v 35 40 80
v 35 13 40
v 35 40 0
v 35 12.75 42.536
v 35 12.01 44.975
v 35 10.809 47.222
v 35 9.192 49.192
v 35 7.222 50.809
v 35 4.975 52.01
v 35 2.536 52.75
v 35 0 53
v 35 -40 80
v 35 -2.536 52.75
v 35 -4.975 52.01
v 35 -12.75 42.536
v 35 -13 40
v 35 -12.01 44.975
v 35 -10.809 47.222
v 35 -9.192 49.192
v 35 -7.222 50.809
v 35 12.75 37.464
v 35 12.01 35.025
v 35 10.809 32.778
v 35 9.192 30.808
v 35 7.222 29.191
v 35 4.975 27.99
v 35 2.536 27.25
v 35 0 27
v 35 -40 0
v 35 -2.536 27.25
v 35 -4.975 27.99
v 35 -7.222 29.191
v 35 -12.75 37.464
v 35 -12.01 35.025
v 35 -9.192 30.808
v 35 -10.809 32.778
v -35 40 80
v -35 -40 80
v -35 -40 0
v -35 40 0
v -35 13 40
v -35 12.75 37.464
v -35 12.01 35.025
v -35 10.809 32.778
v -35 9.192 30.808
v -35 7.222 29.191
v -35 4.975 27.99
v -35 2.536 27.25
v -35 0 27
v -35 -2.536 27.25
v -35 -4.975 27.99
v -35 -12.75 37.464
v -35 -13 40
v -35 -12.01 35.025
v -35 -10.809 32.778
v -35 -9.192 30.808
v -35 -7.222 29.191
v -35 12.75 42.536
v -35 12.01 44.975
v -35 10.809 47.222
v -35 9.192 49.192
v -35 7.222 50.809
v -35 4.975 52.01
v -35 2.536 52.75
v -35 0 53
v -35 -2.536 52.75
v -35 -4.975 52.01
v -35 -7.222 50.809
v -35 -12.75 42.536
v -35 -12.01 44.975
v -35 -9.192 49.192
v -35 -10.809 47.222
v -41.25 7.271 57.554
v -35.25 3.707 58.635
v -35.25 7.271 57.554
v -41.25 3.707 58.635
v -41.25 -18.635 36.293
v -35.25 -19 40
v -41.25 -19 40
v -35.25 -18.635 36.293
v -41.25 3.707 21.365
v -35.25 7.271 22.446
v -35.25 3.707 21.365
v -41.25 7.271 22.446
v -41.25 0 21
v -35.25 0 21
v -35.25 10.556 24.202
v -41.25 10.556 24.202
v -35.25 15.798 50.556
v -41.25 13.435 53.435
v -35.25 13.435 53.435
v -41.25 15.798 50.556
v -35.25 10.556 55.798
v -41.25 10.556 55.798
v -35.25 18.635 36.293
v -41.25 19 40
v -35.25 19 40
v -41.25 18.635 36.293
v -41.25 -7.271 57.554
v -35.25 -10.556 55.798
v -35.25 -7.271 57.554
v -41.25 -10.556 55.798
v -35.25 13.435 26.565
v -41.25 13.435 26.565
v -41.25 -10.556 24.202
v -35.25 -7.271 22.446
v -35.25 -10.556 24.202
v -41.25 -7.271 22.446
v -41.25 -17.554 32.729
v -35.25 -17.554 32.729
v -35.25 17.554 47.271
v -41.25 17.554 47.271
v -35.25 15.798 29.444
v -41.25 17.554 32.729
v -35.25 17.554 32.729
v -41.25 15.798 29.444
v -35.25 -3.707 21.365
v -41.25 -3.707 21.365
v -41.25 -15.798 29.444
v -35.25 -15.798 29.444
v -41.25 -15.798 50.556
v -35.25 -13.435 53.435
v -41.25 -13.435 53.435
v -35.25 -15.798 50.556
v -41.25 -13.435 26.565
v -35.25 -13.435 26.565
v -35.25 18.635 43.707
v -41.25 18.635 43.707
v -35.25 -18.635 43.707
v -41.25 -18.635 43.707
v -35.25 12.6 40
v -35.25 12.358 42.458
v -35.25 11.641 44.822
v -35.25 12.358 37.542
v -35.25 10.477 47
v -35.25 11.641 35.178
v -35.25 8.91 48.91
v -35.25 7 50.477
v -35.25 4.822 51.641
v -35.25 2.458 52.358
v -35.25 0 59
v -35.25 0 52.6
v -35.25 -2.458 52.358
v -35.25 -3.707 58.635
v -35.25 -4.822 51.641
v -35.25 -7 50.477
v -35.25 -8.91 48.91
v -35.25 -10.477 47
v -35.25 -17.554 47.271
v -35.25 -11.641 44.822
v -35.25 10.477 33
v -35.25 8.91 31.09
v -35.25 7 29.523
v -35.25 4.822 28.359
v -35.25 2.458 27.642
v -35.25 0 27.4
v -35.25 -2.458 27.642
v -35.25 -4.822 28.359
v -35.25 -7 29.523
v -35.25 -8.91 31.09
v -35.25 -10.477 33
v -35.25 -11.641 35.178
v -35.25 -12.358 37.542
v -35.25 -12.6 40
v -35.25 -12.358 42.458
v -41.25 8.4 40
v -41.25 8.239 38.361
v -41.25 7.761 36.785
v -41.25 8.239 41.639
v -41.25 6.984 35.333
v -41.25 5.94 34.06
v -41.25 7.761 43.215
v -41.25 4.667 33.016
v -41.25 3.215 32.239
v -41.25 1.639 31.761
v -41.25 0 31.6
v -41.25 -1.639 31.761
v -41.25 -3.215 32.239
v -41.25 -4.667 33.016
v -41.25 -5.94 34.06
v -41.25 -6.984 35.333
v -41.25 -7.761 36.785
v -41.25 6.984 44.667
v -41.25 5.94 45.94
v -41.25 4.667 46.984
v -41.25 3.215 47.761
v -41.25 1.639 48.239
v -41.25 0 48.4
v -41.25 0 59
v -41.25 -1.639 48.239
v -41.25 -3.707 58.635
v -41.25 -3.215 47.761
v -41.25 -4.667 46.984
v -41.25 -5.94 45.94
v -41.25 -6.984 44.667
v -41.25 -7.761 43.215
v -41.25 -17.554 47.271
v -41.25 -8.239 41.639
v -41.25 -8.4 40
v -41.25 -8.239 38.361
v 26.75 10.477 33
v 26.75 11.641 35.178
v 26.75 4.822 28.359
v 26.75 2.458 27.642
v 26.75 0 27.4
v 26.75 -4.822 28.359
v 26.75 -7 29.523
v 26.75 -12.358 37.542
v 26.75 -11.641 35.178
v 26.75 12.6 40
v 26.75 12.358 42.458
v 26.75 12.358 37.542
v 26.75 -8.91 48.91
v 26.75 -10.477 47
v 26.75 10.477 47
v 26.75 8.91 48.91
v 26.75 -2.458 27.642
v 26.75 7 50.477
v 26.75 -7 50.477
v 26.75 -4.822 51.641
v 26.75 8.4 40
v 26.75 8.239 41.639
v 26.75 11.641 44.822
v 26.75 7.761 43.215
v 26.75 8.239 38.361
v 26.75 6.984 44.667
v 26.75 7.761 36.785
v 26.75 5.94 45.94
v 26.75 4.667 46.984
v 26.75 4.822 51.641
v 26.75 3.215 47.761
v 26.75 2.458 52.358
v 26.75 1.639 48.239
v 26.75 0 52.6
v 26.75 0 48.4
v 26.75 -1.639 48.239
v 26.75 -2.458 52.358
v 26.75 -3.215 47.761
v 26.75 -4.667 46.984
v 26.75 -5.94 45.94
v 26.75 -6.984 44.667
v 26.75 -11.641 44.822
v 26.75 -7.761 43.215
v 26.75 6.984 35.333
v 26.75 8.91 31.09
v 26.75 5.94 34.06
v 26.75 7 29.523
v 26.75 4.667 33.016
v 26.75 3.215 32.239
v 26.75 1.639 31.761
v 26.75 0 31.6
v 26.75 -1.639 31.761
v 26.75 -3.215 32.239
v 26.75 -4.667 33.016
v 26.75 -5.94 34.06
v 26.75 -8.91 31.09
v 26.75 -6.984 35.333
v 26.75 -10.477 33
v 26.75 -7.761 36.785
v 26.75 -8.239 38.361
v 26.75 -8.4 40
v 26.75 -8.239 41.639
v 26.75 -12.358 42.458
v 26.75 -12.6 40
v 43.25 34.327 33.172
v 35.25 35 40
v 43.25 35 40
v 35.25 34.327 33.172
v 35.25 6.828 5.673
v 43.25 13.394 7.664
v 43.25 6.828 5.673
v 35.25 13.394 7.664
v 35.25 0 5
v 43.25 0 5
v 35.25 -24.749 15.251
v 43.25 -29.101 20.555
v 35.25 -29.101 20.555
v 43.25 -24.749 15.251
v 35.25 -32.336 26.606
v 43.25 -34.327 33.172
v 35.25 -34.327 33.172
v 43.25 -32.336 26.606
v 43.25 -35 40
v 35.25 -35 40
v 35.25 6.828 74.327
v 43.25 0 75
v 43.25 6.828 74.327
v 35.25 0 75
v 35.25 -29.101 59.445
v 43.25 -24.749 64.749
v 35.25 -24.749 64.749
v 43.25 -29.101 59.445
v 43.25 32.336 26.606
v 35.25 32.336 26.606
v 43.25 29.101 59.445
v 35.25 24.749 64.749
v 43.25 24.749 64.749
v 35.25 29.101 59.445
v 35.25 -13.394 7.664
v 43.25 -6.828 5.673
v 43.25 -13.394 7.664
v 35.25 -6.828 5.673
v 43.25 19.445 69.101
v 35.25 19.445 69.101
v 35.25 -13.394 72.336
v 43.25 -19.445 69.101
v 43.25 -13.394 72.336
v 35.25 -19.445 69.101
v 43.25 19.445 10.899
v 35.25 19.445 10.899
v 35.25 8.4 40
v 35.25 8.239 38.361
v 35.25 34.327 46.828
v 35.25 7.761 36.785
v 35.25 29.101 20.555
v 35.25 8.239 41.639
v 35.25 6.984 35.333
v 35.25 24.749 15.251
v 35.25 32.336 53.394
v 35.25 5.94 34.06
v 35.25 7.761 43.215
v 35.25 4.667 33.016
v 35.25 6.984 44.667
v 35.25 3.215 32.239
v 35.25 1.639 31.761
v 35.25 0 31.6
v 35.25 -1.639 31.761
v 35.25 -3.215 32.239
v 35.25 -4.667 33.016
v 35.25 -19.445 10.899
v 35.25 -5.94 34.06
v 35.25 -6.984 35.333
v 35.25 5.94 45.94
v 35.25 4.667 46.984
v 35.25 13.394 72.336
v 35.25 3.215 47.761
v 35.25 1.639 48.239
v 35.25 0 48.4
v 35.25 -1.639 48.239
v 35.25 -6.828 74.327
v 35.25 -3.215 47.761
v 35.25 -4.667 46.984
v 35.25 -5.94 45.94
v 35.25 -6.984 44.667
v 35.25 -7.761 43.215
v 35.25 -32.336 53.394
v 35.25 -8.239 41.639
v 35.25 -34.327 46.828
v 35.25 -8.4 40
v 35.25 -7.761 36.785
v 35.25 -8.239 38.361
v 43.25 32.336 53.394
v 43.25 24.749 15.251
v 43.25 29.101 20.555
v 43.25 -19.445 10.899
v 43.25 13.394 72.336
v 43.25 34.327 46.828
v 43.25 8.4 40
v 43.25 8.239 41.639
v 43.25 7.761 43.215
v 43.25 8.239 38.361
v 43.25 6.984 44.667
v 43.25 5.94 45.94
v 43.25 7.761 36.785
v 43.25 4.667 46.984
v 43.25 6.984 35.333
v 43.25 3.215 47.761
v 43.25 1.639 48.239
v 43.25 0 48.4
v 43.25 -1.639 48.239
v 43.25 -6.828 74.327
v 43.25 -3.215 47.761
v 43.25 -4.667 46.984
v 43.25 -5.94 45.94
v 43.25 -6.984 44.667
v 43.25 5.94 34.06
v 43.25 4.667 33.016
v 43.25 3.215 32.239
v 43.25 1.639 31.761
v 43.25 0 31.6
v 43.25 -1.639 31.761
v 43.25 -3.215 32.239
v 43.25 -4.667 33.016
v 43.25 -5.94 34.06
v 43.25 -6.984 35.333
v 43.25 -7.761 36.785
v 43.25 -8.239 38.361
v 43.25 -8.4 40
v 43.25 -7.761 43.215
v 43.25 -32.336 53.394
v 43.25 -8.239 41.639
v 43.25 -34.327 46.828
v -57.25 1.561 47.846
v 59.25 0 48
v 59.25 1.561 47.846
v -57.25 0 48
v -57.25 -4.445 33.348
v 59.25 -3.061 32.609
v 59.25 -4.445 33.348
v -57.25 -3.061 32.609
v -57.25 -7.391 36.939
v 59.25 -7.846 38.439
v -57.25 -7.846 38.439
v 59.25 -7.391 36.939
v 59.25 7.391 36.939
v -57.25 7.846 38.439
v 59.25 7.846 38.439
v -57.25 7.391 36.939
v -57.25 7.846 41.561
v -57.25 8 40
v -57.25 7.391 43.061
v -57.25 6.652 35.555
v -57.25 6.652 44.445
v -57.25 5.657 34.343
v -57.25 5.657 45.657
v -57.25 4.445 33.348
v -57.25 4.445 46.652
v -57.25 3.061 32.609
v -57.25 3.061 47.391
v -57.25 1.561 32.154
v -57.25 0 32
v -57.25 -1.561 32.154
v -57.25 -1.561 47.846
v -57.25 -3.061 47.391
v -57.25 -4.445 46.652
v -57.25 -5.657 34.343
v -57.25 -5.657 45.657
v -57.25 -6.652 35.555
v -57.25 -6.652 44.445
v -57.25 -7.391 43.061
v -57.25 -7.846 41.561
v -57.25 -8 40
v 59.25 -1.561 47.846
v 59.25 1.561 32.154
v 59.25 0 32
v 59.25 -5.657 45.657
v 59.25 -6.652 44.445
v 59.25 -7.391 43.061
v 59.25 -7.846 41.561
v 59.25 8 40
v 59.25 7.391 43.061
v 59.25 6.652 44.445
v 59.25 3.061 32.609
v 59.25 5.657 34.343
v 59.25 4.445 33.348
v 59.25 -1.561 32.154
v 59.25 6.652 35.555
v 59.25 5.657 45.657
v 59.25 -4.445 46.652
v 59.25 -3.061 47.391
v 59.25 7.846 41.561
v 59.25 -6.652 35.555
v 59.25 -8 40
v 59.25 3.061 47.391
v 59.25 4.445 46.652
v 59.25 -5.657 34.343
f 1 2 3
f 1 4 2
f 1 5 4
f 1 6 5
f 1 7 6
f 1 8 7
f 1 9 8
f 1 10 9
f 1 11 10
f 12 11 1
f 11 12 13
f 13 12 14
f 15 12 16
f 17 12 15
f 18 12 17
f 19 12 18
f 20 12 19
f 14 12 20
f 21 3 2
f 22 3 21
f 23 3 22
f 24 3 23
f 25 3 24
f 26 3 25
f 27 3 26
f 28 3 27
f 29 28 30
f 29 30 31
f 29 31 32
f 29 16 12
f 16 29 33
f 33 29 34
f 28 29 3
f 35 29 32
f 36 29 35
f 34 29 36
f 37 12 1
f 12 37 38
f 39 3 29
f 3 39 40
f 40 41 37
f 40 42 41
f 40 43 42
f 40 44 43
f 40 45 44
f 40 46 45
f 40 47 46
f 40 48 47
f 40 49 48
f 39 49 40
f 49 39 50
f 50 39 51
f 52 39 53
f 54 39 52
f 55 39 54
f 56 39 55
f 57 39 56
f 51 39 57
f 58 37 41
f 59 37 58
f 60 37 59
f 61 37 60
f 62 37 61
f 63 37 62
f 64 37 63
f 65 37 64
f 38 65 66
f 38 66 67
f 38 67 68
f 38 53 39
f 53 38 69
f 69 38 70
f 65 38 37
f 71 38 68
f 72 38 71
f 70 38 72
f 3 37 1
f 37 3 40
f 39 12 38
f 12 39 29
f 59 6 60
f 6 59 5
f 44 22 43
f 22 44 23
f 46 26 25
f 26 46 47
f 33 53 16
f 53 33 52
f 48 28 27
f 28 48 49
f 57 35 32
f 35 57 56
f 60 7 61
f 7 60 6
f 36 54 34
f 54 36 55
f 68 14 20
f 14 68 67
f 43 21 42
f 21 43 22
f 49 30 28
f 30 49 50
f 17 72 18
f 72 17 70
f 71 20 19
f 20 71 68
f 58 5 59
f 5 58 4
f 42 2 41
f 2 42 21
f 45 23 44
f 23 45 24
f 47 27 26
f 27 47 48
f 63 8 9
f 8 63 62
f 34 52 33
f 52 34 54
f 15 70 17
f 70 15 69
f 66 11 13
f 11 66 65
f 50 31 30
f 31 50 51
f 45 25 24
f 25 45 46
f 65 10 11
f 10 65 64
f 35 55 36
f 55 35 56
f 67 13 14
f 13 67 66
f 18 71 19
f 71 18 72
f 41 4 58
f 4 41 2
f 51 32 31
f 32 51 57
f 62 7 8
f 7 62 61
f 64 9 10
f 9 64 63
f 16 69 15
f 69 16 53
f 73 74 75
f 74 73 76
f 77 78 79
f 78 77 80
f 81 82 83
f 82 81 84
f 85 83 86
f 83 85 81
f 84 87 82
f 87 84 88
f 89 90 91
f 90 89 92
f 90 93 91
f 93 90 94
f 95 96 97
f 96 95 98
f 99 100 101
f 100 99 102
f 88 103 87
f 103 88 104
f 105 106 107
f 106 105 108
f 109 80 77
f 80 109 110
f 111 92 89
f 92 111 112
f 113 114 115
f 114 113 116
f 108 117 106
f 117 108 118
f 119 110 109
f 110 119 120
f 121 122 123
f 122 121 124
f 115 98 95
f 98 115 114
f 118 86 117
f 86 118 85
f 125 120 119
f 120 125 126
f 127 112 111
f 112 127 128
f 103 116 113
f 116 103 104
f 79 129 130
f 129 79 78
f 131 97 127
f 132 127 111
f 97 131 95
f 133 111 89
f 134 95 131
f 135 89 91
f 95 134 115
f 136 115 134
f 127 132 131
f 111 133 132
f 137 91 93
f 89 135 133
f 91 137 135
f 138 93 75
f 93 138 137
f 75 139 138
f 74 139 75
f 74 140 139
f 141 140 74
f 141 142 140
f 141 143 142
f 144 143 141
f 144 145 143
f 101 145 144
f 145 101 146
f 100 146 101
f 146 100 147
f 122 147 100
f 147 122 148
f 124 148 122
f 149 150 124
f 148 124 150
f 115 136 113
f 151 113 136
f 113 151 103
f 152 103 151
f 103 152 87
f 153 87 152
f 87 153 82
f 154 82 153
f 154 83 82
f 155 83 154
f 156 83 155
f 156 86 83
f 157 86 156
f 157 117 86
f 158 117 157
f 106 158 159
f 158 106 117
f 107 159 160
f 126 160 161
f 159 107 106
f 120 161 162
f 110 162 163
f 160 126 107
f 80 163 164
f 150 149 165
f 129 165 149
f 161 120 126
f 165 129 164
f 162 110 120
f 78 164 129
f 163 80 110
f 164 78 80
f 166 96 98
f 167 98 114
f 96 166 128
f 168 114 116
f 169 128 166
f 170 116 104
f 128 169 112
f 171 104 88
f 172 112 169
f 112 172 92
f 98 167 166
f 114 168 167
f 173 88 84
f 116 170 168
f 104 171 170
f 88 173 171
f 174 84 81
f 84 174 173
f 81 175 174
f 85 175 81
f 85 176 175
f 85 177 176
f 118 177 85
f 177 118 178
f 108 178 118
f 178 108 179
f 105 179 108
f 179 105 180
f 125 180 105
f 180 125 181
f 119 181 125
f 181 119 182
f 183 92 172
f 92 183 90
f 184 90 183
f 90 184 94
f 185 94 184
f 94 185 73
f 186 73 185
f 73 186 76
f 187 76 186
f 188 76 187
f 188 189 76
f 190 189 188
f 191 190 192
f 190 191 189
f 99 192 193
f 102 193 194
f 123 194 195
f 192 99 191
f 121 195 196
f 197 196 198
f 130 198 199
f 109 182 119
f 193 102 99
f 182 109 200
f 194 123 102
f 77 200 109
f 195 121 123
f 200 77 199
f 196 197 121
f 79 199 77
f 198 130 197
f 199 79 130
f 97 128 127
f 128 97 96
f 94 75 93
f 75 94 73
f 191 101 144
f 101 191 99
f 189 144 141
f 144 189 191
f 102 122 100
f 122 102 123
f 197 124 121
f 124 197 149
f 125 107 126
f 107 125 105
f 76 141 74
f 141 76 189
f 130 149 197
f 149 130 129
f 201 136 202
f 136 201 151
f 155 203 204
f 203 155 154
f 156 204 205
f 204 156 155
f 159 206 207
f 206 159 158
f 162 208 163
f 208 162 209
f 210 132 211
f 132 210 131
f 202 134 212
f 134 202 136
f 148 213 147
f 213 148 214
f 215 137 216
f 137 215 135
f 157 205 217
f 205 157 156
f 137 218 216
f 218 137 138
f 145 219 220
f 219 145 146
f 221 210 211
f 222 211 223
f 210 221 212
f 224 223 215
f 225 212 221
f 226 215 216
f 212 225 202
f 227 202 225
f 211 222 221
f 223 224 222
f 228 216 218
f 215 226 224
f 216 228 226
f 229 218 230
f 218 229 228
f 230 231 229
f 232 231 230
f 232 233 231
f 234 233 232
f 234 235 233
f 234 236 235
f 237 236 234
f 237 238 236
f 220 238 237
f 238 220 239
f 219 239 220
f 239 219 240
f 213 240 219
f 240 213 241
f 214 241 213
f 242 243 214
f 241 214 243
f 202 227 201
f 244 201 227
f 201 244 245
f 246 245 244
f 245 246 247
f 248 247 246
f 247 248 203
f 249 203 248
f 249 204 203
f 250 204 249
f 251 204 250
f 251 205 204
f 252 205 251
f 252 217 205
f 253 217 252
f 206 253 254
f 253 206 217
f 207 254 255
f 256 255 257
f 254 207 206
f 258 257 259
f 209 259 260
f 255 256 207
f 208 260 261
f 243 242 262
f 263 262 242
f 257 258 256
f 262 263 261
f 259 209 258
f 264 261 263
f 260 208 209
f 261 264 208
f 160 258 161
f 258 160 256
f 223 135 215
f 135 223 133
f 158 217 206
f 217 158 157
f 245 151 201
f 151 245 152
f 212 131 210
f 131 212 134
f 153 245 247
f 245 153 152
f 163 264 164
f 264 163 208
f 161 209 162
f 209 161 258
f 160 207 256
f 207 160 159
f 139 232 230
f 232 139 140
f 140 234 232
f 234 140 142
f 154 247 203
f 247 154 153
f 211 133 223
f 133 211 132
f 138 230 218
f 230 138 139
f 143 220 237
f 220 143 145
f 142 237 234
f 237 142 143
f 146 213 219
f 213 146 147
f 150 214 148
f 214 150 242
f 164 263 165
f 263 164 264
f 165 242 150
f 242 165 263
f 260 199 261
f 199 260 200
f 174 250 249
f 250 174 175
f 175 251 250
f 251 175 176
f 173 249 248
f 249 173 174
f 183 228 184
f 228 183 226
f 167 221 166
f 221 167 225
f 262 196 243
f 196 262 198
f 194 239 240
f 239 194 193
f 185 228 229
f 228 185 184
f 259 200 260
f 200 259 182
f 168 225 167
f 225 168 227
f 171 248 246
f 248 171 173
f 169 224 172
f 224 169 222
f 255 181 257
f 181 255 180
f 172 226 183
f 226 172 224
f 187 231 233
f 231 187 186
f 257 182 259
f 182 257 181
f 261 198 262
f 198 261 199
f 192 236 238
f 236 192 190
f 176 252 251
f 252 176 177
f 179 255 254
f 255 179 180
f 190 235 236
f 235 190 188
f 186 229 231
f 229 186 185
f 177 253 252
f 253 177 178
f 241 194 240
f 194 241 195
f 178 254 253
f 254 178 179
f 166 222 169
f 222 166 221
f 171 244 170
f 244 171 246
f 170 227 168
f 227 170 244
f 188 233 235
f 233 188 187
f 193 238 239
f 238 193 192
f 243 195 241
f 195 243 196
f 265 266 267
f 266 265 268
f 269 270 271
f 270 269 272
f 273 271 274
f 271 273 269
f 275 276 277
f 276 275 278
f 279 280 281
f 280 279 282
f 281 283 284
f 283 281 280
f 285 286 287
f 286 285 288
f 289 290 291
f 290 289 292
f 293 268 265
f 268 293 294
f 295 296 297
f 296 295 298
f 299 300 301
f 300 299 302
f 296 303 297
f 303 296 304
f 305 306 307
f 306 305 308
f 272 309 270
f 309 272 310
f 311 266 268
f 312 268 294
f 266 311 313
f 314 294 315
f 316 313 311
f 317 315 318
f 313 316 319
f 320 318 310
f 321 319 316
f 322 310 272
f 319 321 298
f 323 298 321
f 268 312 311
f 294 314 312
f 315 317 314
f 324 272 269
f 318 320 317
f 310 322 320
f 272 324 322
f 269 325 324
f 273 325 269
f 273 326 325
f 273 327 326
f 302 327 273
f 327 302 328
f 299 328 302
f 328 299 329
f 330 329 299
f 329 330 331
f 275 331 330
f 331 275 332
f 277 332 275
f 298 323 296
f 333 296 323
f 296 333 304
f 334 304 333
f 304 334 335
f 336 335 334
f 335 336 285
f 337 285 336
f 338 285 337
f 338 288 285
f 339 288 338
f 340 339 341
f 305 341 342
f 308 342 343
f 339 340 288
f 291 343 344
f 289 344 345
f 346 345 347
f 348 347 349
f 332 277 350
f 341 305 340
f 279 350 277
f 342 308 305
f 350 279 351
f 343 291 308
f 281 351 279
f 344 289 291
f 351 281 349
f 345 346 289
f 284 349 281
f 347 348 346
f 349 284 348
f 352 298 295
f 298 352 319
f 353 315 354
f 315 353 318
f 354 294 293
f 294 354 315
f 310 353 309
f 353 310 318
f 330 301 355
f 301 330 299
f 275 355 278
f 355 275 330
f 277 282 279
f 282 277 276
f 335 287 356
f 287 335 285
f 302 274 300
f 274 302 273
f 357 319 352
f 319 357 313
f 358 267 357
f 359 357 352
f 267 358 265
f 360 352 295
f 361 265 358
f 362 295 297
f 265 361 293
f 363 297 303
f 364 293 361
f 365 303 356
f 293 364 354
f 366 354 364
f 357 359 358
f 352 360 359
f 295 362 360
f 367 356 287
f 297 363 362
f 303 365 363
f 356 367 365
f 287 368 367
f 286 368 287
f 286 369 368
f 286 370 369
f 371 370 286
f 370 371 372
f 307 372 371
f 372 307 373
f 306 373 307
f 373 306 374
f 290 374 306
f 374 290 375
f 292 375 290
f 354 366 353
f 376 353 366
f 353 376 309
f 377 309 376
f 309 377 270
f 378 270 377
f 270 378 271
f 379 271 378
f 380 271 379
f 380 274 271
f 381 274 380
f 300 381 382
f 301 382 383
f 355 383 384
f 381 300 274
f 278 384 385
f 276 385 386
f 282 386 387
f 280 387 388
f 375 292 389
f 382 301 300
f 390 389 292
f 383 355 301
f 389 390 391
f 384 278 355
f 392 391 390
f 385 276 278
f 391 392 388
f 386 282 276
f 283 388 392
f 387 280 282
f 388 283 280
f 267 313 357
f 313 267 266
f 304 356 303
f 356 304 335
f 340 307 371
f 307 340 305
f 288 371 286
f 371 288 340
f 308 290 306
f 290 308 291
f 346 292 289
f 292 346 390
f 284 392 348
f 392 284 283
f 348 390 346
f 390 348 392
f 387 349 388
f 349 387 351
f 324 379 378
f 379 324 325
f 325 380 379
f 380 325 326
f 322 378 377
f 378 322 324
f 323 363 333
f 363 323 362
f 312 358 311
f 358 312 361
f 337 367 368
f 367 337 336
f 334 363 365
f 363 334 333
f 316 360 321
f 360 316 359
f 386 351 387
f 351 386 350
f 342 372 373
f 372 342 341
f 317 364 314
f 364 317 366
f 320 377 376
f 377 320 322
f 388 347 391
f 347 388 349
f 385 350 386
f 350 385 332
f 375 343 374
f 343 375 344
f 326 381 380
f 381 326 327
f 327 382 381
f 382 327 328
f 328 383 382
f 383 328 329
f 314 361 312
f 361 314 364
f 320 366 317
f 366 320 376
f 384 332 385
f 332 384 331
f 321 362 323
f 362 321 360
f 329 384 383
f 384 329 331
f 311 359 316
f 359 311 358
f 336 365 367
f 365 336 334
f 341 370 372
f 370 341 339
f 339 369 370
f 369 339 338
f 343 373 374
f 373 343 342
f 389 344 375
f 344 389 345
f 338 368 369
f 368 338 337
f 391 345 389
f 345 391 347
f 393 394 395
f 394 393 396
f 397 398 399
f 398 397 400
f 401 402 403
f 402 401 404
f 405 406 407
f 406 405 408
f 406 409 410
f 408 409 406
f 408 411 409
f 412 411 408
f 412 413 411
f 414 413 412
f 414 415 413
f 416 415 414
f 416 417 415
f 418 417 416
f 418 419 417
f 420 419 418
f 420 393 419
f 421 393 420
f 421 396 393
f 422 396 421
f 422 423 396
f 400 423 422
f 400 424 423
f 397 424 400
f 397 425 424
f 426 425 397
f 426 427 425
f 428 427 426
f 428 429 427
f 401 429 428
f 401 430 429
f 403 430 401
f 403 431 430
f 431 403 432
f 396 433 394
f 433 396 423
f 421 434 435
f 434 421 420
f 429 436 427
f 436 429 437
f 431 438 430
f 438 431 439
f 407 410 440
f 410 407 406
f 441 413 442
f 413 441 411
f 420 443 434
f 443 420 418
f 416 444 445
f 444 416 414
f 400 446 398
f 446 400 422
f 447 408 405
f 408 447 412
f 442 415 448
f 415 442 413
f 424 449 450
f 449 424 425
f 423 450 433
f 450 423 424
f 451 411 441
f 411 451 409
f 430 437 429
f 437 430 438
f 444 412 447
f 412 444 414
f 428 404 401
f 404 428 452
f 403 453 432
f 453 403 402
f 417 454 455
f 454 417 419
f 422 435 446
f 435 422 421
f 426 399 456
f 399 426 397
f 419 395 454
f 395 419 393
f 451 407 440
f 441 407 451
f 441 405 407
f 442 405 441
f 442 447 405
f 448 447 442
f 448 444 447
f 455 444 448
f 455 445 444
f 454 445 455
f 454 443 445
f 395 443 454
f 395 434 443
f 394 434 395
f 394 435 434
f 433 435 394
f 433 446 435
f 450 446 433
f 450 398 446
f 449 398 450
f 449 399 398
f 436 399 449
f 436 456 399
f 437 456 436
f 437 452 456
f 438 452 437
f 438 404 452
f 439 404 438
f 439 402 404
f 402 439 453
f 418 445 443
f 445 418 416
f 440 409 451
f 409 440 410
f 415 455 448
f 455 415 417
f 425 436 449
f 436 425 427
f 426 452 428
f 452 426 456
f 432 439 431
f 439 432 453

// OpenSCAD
$fn = 32;

// ------------------------------------------------------------------------
// Bushed housing: 70 x 80 x 80 mm housing, bushing d25.2
// Every part is its own module, assembly() places them once.
// ------------------------------------------------------------------------

// --- part 1 ---
module housing() {
  difference() {
    translate([-35, -40, 0]) cube([70, 80, 80]);
    translate([0, 0, 40]) rotate([0, 90, 0]) cylinder(h = 72, d = 26, center = true);
  }
}

// --- part 2 ---
module bushing() {
  difference() {
    union() {
      cylinder(h = 6, d = 38);
      translate([0, 0, 6]) cylinder(h = 62, d = 25.2);
    }
    translate([0, 0, -1]) cylinder(h = 70, d = 16.8);
  }
}

// --- part 3 ---
module shaft() {
  translate([0, 0, -58.25]) cylinder(h = 116.5, d = 16);
}

// --- part 4 ---
module cover() {
  difference() {
    cylinder(h = 8, d = 70);
    translate([0, 0, -1]) cylinder(h = 10, d = 16.8);
  }
}

// --- assembly ---
module assembly() {
  translate([0, 0, 0]) rotate([0, 0, 0]) housing();
  translate([-41.25, 0, 40]) rotate([0, 90, 0]) bushing();
  translate([1, 0, 40]) rotate([0, 90, 0]) shaft();
  translate([35.25, 0, 40]) rotate([0, 90, 0]) cover();
}

assembly();
